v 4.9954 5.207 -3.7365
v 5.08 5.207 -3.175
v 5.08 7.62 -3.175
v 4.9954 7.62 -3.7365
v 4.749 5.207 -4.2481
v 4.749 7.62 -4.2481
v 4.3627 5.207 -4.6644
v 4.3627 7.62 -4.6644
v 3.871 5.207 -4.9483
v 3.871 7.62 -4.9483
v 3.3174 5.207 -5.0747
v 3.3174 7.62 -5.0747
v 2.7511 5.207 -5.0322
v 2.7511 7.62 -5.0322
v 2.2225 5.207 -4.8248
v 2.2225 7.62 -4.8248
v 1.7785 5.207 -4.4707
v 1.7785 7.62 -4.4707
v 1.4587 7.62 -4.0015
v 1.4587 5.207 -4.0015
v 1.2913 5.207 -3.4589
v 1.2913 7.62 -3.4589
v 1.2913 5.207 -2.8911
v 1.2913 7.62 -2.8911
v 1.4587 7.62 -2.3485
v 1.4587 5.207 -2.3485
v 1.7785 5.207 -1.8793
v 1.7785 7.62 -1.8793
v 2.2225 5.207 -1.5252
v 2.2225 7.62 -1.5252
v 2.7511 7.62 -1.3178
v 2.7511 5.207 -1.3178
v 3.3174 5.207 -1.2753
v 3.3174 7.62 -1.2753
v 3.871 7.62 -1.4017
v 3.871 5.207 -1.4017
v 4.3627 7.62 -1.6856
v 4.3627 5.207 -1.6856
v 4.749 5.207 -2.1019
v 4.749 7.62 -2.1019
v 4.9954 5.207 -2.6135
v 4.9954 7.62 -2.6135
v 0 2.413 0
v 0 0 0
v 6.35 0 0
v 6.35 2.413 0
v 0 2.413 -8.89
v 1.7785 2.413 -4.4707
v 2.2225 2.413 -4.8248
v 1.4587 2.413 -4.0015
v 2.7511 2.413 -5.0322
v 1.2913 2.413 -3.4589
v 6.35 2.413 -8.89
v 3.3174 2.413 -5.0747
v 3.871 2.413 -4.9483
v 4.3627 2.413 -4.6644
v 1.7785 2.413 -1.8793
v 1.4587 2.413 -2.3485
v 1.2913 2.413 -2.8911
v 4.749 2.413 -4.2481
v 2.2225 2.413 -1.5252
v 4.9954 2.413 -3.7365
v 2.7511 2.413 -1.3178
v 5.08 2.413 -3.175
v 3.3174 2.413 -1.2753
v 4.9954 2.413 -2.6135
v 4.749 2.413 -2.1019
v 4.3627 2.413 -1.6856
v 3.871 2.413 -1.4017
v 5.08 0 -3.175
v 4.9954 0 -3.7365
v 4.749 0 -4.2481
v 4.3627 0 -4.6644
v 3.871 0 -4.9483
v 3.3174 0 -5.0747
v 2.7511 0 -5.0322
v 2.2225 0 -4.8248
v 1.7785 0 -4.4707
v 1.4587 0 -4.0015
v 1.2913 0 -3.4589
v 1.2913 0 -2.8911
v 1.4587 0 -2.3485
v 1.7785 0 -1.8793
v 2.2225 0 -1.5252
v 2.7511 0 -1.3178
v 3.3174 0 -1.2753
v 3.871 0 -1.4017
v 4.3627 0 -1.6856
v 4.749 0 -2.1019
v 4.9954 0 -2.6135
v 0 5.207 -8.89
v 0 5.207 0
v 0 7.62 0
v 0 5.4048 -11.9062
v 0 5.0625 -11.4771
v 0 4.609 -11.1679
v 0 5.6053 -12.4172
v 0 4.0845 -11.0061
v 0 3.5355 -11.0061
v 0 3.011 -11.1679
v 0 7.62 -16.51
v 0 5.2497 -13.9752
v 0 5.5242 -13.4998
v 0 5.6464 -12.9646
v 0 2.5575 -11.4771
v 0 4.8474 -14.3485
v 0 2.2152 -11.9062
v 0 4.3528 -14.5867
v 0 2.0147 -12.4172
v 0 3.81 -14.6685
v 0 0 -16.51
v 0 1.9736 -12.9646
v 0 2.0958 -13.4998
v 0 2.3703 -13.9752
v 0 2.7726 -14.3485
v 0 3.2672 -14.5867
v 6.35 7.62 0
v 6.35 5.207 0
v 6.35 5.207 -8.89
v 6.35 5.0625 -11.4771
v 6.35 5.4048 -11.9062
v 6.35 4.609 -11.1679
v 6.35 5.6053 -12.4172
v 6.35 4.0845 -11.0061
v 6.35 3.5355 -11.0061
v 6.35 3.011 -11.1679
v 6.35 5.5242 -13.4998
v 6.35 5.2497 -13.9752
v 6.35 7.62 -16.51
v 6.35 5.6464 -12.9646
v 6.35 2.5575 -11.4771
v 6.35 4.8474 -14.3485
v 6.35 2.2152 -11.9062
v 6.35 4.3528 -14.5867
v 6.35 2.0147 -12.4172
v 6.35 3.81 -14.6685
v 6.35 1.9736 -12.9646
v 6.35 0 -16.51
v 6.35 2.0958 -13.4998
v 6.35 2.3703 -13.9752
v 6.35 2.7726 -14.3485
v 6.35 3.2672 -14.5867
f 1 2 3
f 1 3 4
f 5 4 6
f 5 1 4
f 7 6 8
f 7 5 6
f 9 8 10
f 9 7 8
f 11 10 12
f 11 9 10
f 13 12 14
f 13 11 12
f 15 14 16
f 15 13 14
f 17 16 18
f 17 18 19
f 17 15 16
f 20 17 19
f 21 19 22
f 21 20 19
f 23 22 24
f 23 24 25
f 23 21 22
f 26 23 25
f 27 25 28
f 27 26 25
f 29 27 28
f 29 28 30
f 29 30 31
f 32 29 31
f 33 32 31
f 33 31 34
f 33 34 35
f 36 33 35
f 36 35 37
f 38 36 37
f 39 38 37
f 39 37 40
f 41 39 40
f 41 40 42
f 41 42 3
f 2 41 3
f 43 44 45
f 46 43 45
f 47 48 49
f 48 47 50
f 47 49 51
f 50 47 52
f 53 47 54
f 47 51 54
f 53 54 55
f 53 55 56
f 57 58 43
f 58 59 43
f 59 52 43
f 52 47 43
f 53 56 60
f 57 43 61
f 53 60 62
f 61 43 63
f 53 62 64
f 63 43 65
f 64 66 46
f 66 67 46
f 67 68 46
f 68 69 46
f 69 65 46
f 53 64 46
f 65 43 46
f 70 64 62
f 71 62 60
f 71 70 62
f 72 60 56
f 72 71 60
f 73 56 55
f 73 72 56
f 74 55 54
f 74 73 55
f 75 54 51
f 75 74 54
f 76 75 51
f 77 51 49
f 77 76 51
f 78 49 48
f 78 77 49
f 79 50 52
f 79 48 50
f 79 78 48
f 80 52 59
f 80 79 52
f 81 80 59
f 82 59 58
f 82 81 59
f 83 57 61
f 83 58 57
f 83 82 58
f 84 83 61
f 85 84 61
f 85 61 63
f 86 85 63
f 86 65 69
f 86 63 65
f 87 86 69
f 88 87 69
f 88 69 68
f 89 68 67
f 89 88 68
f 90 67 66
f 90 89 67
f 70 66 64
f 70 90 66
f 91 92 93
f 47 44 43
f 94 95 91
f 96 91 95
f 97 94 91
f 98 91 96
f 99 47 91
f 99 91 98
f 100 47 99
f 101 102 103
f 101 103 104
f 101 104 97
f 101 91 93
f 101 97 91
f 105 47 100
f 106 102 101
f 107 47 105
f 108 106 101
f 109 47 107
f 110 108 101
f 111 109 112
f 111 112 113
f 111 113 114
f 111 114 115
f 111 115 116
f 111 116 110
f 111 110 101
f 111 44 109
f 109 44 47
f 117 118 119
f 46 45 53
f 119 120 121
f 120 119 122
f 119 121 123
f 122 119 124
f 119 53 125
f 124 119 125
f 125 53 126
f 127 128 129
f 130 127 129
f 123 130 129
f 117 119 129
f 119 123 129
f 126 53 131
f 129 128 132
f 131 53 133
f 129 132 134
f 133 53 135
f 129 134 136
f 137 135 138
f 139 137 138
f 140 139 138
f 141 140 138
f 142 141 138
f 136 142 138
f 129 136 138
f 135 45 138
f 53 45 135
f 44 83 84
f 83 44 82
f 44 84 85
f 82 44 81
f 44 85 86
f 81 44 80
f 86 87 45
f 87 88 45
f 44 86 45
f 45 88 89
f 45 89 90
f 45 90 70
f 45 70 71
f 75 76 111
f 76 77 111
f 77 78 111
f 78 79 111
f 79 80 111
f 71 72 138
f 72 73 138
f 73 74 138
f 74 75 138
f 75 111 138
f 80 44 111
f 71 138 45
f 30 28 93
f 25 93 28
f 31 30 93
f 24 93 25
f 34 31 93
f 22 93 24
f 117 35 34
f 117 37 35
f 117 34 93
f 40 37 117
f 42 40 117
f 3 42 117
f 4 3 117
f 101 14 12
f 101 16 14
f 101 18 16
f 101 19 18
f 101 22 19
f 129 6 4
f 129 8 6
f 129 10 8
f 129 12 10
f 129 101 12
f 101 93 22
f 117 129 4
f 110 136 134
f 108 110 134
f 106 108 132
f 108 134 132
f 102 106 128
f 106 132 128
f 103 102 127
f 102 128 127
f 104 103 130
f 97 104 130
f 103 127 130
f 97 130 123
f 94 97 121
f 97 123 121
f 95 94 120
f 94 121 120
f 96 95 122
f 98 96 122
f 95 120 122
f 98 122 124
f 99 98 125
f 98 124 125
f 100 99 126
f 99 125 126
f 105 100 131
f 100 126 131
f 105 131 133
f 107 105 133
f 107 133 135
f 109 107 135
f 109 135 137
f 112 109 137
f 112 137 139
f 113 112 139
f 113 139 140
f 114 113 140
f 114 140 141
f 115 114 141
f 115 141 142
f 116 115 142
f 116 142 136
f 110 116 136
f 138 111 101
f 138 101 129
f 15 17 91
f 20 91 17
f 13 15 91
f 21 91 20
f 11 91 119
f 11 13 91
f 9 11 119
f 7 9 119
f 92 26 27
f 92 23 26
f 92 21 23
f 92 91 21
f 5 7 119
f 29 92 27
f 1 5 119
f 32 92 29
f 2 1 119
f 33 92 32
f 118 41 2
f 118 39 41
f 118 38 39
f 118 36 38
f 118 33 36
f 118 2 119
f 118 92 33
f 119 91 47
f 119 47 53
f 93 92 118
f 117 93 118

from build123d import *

# Parameters (mm, degrees)
SKETCH1_W               = 6.35
SKETCH1_H               = 16.51
SKETCH1_R               = 1.905
BOSS_EXTRUDE1_DEPTH     = 7.62
SKETCH2_W               = 6.35
SKETCH2_H               = 2.794
CUT_EXTRUDE1_DEPTH      = 1
CUT_EXTRUDE1_DEPTH_BACK = 8.89
SKETCH4_R               = 1.8415
CUT_EXTRUDE2_DEPTH      = 7.35


with BuildPart() as part:
    # Sketch1 → Boss-Extrude1 (new body)
    with BuildSketch(Plane(origin=(0, 0, 0), x_dir=(1, 0, 0), z_dir=(0, 1, 0))):
        with Locations((3.175, 8.255)):
            Rectangle(SKETCH1_W, SKETCH1_H)
        with Locations((3.175, 3.175)):
            Circle(SKETCH1_R, mode=Mode.SUBTRACT)
    extrude(amount=BOSS_EXTRUDE1_DEPTH)

    # Sketch2 → Cut-Extrude1 (cut, two sides)
    with BuildSketch(Plane.XY) as cut_extrude1_sk:
        with Locations((3.175, 3.81)):
            Rectangle(SKETCH2_W, SKETCH2_H)
    extrude(amount=CUT_EXTRUDE1_DEPTH, mode=Mode.SUBTRACT)
    extrude(cut_extrude1_sk.sketch, amount=-CUT_EXTRUDE1_DEPTH_BACK, mode=Mode.SUBTRACT)

    # Sketch4 → Cut-Extrude2 (cut, through all)
    with BuildSketch(Plane(origin=(6.35, 0, 0), x_dir=(0, 0, -1), z_dir=(1, 0, 0))):
        with Locations((12.827, 3.81)):
            Circle(SKETCH4_R)
    extrude(amount=-CUT_EXTRUDE2_DEPTH, mode=Mode.SUBTRACT)


solid = part.part
